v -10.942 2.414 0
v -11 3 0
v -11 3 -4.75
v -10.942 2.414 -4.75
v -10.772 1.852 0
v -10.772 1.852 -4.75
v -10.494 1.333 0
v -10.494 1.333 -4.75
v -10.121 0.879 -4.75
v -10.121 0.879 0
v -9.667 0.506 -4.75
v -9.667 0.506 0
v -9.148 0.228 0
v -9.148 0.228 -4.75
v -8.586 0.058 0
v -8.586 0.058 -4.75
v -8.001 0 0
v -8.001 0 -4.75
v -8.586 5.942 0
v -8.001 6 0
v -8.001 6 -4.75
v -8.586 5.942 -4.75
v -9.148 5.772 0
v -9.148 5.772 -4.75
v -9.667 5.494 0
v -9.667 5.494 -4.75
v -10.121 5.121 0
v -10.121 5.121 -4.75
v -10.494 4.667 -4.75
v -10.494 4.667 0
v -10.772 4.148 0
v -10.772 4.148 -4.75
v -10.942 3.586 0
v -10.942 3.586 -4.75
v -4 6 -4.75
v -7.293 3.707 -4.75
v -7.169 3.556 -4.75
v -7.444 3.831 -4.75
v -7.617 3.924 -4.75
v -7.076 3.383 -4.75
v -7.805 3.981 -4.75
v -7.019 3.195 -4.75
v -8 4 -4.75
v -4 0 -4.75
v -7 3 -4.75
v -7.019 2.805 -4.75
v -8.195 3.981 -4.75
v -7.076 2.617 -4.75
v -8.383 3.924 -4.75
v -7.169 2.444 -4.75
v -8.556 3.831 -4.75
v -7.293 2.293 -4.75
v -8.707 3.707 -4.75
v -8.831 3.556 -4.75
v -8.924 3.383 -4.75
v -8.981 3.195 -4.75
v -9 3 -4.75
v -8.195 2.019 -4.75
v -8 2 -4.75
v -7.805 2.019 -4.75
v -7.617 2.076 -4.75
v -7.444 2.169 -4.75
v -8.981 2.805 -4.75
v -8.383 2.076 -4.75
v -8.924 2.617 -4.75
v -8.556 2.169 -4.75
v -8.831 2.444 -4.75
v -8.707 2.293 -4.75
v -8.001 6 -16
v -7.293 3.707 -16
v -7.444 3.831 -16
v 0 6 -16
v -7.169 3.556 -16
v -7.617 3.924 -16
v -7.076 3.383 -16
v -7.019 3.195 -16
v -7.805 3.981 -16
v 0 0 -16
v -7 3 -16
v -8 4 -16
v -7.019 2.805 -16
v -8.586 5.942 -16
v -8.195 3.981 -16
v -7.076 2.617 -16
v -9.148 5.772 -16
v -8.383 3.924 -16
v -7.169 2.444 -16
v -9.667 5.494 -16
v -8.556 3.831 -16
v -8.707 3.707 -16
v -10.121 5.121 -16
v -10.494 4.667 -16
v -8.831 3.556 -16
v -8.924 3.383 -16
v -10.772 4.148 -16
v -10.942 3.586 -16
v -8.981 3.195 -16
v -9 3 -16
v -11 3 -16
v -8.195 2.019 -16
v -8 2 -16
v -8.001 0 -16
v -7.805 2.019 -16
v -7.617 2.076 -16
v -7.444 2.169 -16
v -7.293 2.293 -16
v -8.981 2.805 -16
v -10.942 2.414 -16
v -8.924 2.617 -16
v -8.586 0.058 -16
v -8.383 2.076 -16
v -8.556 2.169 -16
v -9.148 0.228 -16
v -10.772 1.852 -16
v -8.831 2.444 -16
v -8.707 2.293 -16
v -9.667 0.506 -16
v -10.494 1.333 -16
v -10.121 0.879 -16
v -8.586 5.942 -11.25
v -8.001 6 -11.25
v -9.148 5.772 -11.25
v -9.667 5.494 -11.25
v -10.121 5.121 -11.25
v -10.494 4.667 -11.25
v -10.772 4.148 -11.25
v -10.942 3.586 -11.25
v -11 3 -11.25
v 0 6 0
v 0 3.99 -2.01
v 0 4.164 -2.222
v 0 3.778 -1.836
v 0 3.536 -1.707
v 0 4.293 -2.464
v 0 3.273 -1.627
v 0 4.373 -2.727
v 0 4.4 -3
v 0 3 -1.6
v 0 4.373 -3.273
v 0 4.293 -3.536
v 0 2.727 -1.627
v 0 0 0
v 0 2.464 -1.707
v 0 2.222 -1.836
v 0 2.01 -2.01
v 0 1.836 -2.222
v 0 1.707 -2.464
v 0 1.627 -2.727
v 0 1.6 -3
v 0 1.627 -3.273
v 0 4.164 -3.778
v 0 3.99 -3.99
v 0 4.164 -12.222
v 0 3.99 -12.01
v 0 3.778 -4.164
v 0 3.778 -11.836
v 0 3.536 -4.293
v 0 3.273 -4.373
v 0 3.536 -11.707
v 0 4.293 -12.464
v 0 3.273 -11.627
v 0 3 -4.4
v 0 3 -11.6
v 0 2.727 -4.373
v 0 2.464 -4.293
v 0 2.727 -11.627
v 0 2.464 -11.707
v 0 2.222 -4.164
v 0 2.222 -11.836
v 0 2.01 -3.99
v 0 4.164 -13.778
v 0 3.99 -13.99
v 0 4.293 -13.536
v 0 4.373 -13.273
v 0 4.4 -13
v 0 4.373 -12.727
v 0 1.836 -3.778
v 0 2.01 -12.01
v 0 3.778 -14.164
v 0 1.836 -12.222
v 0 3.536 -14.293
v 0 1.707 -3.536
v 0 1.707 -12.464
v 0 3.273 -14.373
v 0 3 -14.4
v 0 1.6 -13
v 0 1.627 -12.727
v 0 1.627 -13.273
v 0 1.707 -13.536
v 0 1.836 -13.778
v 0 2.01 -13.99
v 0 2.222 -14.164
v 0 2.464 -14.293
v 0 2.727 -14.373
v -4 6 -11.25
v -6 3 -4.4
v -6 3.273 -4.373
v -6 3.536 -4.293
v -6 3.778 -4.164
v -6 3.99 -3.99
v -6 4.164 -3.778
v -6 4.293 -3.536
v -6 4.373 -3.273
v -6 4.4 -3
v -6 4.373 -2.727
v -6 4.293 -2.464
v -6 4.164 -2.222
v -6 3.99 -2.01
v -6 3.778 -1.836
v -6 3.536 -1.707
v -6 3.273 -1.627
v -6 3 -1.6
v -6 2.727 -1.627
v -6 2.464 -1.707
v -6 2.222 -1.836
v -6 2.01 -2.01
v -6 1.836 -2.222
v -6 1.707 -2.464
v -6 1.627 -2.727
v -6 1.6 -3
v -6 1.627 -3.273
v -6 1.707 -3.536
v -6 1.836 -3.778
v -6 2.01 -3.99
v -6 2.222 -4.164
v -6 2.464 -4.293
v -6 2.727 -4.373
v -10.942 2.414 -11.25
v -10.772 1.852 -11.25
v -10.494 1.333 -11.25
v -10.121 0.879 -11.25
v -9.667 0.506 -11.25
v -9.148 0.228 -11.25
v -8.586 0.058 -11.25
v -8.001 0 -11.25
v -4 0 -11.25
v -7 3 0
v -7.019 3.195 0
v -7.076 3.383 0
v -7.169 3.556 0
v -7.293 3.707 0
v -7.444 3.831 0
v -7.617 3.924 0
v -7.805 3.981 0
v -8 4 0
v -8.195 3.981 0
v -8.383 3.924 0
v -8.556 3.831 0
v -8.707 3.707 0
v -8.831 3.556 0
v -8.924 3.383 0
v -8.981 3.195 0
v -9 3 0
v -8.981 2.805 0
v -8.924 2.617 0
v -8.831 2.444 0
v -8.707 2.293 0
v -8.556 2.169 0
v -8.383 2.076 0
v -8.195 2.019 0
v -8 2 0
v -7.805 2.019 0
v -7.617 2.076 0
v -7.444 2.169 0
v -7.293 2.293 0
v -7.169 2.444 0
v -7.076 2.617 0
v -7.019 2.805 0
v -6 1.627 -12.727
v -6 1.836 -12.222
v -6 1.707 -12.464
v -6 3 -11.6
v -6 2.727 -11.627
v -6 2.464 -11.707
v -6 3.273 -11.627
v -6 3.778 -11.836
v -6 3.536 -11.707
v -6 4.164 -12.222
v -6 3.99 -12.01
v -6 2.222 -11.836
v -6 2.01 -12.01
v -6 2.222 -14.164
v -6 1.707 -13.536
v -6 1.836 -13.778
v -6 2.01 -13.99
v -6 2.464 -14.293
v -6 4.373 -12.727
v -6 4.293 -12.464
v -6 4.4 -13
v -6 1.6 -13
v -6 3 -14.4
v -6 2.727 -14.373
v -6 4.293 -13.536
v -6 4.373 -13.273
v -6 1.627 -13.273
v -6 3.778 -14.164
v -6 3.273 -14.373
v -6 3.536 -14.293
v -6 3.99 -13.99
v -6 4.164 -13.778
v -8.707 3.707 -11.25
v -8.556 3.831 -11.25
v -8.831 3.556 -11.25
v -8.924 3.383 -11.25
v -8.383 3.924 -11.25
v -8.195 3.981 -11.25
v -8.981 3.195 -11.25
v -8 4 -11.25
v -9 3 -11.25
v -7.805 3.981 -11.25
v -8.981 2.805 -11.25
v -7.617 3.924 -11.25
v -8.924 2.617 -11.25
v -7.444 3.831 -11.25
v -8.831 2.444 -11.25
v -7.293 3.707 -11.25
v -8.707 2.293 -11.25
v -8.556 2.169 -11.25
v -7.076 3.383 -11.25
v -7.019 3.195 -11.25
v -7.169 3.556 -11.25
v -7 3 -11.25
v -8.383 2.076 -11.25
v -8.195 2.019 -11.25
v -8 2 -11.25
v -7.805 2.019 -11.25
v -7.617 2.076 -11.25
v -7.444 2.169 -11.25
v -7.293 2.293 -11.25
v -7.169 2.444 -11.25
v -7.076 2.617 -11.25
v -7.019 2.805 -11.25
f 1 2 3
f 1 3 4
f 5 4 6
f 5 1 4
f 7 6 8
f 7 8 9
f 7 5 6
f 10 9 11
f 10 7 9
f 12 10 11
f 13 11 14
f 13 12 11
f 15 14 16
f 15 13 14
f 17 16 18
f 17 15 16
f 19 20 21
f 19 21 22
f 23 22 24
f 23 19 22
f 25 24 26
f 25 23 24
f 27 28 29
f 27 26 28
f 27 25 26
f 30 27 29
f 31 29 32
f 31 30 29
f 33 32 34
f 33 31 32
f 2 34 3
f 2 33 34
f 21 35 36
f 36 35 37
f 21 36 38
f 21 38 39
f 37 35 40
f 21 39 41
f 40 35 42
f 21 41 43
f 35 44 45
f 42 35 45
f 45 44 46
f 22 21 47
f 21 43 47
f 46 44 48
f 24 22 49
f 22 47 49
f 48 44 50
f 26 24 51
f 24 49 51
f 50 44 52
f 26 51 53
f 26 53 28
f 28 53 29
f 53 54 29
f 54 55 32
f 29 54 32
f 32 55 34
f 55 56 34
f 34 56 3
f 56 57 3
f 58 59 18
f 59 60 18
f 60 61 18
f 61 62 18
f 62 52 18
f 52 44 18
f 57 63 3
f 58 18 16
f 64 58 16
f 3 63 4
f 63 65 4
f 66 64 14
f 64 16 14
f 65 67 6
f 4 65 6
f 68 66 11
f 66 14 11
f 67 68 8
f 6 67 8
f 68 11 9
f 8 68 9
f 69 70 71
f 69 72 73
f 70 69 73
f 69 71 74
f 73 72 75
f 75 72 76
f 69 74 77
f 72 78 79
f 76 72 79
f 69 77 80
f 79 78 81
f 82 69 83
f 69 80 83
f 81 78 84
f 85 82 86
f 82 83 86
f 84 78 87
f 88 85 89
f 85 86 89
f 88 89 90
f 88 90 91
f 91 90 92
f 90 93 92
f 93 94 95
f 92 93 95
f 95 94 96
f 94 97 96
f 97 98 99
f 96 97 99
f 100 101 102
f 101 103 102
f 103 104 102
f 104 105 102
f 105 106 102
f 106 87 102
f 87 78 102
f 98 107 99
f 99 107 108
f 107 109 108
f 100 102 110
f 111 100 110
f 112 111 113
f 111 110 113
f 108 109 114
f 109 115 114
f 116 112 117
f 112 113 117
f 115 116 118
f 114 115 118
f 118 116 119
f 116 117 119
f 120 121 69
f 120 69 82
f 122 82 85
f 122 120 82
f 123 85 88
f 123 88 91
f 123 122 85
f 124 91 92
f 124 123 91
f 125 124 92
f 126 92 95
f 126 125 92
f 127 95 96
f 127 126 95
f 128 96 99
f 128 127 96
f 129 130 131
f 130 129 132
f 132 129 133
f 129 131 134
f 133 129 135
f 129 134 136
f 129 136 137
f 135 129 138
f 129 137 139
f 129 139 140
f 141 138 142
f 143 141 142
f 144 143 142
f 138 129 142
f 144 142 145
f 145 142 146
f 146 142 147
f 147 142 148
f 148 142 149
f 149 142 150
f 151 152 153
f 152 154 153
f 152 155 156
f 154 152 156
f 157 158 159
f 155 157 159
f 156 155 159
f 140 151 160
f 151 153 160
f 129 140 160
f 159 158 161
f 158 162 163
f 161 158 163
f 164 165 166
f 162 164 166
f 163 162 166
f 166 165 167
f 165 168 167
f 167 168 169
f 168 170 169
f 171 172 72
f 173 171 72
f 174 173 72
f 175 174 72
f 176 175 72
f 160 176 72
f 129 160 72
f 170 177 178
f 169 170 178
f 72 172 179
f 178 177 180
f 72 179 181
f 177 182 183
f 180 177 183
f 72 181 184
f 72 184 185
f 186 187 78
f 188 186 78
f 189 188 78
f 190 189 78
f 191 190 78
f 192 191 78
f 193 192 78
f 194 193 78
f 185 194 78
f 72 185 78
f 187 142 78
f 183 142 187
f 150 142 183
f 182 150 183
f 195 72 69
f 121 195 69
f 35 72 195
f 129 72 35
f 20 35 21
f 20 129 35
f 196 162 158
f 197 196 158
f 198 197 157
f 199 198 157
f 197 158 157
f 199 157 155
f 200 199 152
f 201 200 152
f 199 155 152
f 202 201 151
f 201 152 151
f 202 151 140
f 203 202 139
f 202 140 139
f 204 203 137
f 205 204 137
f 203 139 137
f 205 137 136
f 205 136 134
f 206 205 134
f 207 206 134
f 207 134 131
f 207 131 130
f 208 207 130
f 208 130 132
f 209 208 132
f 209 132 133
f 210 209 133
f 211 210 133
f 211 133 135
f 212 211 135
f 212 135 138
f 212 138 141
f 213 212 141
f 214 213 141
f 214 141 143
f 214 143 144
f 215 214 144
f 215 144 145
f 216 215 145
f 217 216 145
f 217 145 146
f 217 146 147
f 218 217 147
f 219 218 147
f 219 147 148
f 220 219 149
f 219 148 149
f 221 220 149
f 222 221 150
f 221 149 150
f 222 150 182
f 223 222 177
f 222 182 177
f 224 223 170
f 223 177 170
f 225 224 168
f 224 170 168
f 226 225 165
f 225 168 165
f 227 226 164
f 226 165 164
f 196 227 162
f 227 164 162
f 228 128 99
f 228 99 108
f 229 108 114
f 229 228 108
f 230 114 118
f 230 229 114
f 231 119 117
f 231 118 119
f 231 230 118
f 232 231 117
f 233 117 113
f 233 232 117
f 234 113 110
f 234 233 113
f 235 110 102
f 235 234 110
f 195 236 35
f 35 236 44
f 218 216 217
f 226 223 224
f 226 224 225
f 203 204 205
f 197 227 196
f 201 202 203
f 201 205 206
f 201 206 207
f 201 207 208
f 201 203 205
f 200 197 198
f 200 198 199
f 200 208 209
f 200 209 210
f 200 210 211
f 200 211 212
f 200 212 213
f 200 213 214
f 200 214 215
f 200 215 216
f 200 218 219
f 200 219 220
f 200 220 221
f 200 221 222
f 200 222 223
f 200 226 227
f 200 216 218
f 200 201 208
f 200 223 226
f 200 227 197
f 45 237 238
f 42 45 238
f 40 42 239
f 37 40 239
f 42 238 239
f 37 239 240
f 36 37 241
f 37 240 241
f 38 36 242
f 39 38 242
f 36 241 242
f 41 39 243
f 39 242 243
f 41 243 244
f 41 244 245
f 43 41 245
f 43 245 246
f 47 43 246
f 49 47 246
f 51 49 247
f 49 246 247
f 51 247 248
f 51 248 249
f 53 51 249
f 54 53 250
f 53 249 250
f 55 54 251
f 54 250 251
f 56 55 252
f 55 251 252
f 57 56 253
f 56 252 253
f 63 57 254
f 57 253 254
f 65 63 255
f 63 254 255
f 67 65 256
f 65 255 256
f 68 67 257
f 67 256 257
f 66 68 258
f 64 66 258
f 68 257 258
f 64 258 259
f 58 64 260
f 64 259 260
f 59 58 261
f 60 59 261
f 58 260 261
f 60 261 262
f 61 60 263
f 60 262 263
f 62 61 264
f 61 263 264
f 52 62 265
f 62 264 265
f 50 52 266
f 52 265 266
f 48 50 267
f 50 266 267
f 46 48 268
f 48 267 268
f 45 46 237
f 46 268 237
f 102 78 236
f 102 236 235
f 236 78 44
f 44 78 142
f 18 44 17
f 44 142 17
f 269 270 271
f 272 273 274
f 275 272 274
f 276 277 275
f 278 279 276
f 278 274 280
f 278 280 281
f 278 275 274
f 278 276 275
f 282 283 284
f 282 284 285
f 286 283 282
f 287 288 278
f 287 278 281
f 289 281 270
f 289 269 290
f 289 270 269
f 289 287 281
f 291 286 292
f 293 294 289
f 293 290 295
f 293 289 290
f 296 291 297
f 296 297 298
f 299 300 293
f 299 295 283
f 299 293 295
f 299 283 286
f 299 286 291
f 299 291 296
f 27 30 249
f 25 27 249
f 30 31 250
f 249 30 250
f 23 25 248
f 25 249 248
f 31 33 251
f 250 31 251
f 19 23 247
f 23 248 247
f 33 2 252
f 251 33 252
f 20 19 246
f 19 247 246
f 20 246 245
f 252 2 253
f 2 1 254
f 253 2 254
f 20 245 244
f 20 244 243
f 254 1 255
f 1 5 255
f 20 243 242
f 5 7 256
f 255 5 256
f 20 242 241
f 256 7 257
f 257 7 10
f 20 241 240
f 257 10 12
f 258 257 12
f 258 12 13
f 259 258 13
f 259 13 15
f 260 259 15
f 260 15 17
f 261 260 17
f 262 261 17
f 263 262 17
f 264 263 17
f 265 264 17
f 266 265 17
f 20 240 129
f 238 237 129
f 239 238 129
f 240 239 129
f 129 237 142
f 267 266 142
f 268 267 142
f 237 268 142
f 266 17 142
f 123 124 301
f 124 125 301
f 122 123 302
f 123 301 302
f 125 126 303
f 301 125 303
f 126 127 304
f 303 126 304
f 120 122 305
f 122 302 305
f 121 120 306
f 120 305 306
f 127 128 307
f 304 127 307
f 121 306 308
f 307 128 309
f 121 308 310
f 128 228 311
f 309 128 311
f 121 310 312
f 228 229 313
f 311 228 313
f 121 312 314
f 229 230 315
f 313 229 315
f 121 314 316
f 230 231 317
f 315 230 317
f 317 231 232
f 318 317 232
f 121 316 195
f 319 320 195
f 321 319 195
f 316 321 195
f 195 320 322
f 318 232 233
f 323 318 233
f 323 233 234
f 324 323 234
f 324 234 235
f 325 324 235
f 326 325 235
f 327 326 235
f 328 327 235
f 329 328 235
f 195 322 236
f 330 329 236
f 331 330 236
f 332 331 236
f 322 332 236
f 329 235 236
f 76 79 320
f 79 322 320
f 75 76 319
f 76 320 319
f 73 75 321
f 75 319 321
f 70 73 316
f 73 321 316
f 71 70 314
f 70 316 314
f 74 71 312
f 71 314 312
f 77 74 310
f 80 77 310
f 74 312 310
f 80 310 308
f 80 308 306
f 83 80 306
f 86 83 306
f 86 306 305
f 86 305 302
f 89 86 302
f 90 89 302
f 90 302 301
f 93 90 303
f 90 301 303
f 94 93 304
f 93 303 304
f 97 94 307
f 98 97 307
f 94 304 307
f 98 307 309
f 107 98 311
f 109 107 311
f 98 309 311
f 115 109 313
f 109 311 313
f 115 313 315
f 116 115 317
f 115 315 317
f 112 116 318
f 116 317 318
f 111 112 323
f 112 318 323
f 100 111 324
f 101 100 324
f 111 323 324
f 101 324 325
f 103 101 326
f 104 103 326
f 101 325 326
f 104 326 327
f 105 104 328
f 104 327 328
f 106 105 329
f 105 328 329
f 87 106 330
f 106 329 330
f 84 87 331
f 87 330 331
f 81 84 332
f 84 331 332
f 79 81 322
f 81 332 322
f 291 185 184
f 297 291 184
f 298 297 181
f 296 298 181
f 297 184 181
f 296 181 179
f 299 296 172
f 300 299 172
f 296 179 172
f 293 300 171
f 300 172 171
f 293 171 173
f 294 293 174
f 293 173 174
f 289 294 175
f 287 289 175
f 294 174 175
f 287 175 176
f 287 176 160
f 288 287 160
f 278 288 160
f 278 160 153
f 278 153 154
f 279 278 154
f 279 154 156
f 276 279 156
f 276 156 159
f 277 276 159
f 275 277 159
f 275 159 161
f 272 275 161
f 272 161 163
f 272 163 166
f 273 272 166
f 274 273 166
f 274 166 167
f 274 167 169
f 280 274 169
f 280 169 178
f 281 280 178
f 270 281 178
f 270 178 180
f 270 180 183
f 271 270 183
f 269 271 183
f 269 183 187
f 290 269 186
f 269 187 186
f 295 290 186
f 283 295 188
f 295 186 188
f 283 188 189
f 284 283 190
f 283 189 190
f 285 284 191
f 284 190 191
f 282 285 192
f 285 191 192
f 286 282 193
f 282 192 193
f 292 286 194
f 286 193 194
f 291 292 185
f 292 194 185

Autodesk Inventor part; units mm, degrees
ref_plane "YZ Plane" through (0, 0, 0) normal (1, 0, 0) x (0, 1, 0)
ref_plane "XZ Plane" through (0, 0, 0) normal (0, 1, 0) x (-1, 0, 0)
ref_plane "XY Plane" through (0, 0, 0) normal (0, 0, 1) x (1, 0, 0)
sketch "Sketch7" plane through (0, 0, 0) normal (0, 1, 0) x (-1, 0, 0)
  line L0 (0, 0) -> (0, -16)
  line L1 (0, -16) -> (11, -16)
  line L2 (11, -16) -> (11, -11.25)
  line L3 (11, -11.25) -> (4, -11.25)
  line L4 (4, -11.25) -> (4, -4.75)
  line L5 (4, -4.75) -> (11, -4.75)
  line L6 (11, -4.75) -> (11, 0)
  line L7 (11, 0) -> (0, 0)
  dimension "d25" = 16
  dimension "d26" = 6.5
  dimension "d27" = 7
  dimension "d28" = 4
extrude "Extrusion7" add sketch "Sketch7" along normal blind 6
sketch "Sketch8" plane through (0, 0, 0) normal (1, 0, 0) x (0, 0, -1)
  line L0 (0, 0) -> (16, 0) projected
  line L1 (16, 0) -> (16, 6) projected
  line L2 (16, 6) -> (0, 6) projected
  line L3 (0, 0) -> (0, 6) projected
  line L4 (4.75, 6) -> (11.25, 6) construction
  line L5 (8, 6) -> (8, 0) construction
  line L6 (11.25, 0) -> (4.75, 0) construction
  line L7 (16, 0) -> (16, 6) construction
  line L8 (16, 3) -> (0, 3) construction
  line L9 (0, 0) -> (0, 6) construction
  circle A0 centre (3, 3) radius 1.4
  circle A1 centre (13, 3) radius 1.4
  dimension "d31" = 2.8
  dimension "d32" = 10
extrude "Extrusion8" cut sketch "Sketch8" against normal blind 6 contours A0 | A1
sketch "Sketch9" plane through (-11, 0, 0) normal (0, 0, 1) x (1, 0, 0)
  line L0 (0, 0) -> (11, 0) projected
  line L1 (11, 0) -> (11, 6) projected
  line L2 (11, 6) -> (0, 6) projected
  line L3 (0, 0) -> (0, 6) projected
  line L4 (11, 0) -> (11, 6) construction
  line L5 (11, 3) -> (0, 3) construction
  circle A0 centre (3, 3) radius 1
  dimension "d35" = 2
  dimension "d36" = 3
extrude "Extrusion9" cut sketch "Sketch9" against normal through all contours A0
fillet "Fillet2" radius 3 4 edges at (-11, 6, -13.625) (-11, 0, -13.625) (-11, 6, -2.375) (-11, 0, -2.375)
properties part number "drzak_pritlaku"
